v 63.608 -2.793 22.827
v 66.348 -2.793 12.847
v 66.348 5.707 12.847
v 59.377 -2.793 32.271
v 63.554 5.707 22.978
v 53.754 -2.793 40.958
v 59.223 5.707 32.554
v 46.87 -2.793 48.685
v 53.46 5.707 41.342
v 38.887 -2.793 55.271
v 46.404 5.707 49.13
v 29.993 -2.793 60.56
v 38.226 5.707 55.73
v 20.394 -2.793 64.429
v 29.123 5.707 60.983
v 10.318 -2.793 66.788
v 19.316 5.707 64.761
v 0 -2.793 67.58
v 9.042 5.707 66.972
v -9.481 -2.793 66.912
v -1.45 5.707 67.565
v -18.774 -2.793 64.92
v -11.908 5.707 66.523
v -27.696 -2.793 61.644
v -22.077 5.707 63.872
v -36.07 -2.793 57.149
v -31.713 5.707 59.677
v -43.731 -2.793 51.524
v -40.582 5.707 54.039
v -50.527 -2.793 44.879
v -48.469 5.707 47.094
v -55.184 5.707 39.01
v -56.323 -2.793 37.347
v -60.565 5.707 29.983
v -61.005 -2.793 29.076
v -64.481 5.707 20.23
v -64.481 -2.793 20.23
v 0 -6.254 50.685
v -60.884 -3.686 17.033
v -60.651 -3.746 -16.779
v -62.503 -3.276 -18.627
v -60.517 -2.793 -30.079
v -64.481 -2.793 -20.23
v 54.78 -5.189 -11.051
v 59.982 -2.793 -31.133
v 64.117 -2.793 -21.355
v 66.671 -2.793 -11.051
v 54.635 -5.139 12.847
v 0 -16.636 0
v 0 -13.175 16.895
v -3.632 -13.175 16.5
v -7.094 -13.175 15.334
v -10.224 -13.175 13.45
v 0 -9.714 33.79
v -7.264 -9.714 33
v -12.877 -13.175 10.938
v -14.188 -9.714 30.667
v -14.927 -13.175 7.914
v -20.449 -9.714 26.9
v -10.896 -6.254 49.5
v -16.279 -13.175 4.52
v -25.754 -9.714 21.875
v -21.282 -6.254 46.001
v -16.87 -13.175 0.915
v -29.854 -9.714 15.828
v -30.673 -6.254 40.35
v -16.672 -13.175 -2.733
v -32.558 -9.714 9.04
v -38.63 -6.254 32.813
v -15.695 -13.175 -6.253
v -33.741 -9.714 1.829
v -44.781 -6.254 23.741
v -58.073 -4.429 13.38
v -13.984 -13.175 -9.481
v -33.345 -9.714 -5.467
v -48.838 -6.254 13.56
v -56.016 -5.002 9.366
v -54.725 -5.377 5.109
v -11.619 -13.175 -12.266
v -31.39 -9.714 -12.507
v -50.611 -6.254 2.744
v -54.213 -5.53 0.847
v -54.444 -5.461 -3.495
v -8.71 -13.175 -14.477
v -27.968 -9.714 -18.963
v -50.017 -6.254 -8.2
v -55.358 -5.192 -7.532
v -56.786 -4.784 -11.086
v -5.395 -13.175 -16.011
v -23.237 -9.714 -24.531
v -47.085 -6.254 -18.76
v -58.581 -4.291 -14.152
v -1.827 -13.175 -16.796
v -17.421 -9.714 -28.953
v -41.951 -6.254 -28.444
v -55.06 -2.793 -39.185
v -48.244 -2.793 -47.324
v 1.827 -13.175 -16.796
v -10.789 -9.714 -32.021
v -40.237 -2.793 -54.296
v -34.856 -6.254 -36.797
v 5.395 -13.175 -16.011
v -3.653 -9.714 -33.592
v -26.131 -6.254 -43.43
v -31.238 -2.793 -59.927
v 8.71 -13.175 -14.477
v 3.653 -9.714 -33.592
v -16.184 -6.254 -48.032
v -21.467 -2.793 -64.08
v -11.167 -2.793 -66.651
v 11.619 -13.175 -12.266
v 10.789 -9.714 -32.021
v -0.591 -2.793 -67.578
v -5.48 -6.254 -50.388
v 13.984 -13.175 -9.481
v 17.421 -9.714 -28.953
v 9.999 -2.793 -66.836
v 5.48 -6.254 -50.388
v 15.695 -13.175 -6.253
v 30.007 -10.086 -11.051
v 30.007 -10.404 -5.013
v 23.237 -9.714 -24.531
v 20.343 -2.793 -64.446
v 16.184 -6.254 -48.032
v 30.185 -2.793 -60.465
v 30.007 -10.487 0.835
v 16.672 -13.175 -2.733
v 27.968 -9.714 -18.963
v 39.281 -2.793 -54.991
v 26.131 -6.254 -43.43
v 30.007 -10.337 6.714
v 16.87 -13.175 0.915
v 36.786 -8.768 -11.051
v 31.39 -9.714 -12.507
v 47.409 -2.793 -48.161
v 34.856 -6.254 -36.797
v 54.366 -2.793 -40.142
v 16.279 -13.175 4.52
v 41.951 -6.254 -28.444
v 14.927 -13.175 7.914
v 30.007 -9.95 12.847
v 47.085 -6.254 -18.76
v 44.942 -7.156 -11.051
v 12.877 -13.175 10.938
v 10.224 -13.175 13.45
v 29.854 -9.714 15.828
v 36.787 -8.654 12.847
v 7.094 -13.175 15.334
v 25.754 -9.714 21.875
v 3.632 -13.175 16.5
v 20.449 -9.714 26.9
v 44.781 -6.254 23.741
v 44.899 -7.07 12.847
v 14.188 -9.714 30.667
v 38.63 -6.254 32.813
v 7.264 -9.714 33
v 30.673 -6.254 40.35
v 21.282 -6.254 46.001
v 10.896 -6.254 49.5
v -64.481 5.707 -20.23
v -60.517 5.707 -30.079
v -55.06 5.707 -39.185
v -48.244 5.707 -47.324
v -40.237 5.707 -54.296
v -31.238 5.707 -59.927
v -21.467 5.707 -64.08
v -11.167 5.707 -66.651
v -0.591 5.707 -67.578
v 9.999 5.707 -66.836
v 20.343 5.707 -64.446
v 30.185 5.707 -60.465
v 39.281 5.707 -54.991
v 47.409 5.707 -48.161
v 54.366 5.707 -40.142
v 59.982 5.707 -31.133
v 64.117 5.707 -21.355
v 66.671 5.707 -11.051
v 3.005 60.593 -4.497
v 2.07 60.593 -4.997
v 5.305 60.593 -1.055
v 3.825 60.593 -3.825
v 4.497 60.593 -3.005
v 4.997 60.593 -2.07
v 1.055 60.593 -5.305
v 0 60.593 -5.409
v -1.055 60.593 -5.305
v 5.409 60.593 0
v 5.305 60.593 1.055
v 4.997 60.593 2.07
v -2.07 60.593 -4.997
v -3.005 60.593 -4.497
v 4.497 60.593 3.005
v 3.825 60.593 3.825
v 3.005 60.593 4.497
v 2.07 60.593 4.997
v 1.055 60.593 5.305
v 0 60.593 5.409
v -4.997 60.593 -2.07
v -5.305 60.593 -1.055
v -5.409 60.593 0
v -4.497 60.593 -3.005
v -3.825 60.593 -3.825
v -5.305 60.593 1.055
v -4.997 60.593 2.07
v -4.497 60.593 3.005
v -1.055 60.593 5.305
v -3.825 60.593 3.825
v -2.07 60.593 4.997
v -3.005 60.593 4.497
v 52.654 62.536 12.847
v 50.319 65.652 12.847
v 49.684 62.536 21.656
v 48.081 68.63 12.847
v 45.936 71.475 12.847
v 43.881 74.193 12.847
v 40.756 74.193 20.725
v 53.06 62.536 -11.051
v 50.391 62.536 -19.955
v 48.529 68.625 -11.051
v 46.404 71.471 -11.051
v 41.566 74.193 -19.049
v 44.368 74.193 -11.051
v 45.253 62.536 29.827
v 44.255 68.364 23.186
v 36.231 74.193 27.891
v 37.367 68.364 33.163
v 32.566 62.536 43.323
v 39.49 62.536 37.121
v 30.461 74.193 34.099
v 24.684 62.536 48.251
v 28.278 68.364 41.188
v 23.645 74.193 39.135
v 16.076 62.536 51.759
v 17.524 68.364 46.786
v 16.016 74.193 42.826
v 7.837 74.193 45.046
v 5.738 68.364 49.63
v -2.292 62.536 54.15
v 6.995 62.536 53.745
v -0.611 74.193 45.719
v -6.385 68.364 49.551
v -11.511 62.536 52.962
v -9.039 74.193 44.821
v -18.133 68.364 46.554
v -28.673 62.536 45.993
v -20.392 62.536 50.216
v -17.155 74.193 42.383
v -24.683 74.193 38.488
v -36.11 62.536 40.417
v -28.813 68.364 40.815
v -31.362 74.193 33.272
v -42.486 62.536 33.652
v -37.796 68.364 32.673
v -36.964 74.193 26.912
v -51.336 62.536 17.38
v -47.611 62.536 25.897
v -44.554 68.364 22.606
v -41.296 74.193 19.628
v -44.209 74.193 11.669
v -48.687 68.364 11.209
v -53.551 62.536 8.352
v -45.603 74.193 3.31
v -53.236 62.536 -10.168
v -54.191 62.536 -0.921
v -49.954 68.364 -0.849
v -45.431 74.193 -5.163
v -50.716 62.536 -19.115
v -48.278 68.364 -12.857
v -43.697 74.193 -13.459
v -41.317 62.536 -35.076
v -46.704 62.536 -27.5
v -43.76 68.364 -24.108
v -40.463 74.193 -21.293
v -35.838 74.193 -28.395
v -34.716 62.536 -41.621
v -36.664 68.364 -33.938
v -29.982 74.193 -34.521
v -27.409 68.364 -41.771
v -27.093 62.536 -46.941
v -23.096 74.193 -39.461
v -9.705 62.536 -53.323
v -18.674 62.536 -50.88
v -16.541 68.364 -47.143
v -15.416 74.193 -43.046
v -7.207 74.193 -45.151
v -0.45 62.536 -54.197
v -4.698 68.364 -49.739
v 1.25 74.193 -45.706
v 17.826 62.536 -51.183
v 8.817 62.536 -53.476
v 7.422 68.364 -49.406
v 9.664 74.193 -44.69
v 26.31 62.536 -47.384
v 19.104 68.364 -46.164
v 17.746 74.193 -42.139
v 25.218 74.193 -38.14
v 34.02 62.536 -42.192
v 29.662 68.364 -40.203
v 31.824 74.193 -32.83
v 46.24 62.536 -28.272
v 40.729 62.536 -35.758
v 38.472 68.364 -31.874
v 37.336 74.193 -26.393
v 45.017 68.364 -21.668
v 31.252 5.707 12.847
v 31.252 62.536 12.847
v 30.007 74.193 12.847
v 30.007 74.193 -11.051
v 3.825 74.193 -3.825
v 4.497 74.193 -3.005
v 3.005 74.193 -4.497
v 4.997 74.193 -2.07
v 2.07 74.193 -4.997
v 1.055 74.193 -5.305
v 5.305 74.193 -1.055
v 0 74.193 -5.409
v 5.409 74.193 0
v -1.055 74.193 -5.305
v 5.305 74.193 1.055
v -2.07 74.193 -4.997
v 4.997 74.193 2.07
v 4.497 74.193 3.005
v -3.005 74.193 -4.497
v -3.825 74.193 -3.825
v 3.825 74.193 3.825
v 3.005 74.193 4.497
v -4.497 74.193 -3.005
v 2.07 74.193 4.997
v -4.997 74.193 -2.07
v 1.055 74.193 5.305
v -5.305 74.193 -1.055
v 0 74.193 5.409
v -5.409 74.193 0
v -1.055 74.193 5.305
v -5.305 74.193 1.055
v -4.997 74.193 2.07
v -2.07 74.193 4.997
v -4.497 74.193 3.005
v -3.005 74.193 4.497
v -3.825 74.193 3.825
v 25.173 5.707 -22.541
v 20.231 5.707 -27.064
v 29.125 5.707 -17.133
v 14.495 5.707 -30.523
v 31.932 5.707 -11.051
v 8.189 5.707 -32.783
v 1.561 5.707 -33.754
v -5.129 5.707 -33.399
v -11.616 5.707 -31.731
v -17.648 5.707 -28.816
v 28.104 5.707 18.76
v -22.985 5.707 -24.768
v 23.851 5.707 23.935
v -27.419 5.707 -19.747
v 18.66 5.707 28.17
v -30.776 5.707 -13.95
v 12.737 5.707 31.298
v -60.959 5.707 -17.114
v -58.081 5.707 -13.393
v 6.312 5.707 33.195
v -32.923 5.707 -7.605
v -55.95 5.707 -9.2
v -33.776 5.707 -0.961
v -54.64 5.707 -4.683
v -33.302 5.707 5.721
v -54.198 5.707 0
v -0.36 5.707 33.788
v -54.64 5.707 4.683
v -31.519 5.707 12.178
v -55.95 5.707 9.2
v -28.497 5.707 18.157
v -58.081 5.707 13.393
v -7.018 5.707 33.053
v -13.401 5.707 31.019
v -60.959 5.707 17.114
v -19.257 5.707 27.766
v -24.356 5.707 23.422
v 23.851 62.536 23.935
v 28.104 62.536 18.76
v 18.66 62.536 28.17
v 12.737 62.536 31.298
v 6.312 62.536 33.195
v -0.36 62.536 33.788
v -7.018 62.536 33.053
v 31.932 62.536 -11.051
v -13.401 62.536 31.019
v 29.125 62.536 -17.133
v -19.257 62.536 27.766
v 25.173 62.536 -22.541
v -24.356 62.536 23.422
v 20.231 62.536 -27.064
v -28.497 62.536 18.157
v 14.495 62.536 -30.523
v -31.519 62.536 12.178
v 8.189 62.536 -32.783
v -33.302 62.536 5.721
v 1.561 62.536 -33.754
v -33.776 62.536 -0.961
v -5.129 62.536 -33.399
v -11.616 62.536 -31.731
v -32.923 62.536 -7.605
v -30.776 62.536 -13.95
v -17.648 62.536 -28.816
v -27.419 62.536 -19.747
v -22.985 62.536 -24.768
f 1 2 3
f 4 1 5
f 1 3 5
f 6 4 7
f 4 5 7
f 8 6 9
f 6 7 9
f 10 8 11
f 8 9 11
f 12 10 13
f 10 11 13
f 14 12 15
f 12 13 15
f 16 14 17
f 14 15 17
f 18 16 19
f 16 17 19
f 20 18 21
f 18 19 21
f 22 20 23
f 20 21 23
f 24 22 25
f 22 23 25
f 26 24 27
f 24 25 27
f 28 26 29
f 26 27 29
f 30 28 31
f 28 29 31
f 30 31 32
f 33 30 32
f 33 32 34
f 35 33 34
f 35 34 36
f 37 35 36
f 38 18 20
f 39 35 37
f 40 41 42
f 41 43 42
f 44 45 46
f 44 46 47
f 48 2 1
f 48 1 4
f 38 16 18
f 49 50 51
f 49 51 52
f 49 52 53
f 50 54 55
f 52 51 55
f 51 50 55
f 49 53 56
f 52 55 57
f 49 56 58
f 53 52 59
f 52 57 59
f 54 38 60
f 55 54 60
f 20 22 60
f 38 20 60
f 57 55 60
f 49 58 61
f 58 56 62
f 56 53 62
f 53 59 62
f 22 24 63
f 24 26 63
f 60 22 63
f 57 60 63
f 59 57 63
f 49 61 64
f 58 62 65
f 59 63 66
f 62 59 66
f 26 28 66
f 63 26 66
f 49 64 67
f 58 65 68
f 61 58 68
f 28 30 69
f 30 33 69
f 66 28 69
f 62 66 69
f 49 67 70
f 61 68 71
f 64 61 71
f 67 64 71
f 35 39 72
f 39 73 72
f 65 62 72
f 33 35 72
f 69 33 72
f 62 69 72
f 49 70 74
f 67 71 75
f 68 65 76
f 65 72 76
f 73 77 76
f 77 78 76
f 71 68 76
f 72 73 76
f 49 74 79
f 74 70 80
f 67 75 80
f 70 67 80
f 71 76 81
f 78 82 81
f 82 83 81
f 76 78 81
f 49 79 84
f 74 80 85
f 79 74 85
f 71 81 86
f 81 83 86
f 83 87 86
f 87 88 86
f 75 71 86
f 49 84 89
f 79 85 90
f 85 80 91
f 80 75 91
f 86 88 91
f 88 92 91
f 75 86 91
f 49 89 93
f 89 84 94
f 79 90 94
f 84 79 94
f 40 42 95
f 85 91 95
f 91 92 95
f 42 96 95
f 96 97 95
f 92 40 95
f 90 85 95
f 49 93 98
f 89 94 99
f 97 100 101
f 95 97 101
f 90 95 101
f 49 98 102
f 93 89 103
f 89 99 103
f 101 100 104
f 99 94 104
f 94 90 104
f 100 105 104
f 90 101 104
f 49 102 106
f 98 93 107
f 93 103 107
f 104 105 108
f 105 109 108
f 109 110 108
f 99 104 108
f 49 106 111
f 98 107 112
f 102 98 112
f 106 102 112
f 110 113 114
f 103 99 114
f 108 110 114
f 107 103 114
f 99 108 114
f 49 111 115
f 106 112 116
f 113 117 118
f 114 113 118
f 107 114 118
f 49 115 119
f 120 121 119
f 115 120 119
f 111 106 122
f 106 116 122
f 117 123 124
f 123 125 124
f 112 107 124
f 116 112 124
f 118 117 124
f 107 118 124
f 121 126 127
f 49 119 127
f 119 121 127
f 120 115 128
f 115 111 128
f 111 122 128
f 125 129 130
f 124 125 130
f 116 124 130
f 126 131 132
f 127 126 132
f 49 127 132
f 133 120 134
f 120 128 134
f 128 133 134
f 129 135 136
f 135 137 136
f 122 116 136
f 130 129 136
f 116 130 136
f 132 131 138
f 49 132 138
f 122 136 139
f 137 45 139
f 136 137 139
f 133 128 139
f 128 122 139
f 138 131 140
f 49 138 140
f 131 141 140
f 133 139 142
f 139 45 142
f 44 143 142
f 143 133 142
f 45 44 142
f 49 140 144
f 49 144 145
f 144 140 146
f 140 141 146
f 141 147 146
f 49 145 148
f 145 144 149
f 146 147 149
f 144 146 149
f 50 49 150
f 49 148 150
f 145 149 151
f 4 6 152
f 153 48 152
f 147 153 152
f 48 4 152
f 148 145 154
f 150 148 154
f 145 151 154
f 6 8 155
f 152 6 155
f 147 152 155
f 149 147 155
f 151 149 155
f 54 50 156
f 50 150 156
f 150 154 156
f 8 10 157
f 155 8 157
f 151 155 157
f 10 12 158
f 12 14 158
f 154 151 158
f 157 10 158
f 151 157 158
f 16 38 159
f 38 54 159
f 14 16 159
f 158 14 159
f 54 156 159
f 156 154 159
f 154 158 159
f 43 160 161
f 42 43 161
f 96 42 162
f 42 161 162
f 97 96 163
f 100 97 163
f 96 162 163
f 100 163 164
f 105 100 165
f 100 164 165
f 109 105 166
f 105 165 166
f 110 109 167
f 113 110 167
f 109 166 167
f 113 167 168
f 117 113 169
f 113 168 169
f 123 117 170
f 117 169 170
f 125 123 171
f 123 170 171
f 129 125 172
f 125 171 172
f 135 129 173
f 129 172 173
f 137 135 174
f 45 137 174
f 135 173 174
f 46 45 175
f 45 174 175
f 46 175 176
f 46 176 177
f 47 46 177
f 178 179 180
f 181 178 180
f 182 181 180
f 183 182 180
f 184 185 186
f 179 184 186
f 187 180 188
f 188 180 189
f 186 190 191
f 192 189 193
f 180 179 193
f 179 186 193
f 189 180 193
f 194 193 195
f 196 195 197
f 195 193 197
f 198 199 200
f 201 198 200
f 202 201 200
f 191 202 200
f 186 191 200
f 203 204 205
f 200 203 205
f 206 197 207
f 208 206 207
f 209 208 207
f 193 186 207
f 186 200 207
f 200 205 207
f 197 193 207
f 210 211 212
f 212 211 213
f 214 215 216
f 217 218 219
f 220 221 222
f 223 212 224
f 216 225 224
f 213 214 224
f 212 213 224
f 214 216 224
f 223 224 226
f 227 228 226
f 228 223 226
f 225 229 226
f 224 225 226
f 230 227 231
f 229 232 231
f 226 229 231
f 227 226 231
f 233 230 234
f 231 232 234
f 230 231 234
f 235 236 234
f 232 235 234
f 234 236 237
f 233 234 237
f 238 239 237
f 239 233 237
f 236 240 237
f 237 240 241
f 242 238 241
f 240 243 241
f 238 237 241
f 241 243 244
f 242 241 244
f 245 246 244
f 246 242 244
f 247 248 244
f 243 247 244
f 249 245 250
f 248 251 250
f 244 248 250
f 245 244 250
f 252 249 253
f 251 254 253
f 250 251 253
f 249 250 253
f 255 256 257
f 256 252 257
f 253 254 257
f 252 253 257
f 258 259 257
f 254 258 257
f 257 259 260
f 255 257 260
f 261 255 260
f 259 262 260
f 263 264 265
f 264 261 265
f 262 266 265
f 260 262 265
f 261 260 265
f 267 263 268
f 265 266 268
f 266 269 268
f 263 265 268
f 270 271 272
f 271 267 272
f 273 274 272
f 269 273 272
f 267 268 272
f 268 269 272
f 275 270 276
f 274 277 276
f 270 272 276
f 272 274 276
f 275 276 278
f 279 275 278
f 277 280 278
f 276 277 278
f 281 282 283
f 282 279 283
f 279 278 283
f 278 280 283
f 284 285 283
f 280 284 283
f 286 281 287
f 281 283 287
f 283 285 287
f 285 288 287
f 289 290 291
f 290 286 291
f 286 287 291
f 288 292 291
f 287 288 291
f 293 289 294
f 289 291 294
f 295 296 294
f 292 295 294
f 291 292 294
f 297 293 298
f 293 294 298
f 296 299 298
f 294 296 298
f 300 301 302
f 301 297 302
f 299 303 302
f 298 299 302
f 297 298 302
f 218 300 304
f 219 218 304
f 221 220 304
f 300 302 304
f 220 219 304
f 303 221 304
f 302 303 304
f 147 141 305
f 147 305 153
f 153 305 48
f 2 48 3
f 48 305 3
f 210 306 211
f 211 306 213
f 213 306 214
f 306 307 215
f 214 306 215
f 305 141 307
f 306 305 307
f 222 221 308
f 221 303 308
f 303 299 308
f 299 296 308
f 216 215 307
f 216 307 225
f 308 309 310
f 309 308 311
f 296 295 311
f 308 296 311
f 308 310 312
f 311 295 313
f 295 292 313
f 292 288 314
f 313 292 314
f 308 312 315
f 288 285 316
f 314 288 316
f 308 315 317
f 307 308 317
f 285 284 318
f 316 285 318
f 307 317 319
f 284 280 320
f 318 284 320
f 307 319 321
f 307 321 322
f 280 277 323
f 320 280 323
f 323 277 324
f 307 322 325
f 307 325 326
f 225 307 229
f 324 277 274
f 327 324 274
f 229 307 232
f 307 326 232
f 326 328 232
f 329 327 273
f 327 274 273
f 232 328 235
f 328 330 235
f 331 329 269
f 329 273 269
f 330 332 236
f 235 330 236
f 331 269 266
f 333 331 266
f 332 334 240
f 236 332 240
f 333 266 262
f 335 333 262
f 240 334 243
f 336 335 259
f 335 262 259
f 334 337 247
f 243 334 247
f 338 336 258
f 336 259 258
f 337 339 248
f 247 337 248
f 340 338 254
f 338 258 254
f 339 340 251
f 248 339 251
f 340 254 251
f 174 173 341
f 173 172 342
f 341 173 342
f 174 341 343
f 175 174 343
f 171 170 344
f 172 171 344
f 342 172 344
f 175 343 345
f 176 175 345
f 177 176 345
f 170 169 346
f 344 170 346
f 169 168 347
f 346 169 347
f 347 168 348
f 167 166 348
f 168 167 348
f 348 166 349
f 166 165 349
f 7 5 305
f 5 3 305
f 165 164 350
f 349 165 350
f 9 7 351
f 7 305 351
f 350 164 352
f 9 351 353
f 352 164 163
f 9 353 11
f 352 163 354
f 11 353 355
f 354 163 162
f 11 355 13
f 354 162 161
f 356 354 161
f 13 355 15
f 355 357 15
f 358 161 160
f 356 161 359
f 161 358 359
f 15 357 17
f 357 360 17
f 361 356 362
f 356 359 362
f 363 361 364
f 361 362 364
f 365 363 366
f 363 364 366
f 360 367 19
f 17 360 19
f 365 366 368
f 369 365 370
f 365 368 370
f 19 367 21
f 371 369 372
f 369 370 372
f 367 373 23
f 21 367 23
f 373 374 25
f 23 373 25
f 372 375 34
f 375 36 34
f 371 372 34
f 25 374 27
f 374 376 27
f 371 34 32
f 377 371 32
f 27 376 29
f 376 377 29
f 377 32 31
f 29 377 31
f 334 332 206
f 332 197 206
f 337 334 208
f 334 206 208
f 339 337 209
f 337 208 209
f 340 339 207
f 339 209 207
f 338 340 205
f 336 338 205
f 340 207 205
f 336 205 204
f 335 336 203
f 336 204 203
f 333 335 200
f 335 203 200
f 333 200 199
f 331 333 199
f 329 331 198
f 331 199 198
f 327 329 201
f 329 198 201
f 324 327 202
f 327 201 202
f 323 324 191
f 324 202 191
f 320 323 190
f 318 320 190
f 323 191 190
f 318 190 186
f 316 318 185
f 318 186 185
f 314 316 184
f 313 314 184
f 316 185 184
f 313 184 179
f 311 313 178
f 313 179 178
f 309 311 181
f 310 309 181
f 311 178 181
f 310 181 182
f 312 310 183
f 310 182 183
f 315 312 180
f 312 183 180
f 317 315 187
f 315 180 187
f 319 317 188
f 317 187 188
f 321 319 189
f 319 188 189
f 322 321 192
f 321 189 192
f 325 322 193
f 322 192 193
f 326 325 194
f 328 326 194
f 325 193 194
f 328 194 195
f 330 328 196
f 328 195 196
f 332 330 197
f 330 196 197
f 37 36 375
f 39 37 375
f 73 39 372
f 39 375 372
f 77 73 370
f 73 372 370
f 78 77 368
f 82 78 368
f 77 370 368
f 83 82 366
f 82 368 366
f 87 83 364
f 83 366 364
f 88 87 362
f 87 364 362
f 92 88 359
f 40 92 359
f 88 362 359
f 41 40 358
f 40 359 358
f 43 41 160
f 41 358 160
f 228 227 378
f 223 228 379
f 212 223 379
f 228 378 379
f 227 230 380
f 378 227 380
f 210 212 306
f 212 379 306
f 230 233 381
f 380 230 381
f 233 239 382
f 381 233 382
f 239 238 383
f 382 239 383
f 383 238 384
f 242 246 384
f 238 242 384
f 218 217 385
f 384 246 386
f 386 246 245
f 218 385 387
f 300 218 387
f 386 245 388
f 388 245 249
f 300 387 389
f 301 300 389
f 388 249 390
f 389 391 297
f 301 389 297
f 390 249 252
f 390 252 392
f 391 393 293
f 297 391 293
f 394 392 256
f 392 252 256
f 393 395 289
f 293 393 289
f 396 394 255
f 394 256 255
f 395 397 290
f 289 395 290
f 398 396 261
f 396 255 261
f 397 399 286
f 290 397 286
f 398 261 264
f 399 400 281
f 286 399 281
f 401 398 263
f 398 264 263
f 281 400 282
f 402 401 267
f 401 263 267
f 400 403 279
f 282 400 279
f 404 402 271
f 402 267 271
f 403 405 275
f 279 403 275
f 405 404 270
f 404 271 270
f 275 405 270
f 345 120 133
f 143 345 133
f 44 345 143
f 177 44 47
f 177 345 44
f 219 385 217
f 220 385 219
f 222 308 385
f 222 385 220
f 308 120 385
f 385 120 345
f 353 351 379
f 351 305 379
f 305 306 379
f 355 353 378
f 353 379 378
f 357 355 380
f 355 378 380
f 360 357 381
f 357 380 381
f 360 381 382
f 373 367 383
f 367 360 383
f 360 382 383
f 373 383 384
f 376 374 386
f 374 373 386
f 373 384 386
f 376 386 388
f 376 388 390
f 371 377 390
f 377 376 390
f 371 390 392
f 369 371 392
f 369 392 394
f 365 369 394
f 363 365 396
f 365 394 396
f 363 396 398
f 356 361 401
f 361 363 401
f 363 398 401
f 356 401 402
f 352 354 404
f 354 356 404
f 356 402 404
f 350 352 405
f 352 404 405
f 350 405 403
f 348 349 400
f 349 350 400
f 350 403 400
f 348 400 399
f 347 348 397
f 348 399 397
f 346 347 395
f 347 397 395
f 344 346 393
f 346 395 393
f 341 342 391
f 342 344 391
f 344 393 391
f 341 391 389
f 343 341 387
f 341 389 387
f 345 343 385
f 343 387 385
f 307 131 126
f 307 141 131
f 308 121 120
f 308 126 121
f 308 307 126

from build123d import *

# Parameters (mm, degrees)
ESQUISSE2_R             = 25.041983138
ESQUISSE2_W             = 44.202160672
ESQUISSE2_H             = 23.897916136
ENL_V_MAT_EXTRU_1_DEPTH = 90


with BuildPart() as part:
    # Esquisse1 → Révolution1 (revolve)
    with BuildSketch(Plane.XY, mode=Mode.PRIVATE) as r_volution1_sk:
        Polygon((-45.722988866, 74.192857143), (-5.408703152, 74.192857143), (-5.408703152, 60.592857143), (0, 60.592857143), (0, -16.635714286), (-67.580131723, -2.792857143), (-67.580131723, 5.707142857), (-33.790065862, 5.707142857), (-33.790065862, 62.535714286), (-54.198475628, 62.535714286), align=None)
    revolve(r_volution1_sk.sketch.rotate(Axis((0, 60.592857143, 0), (0, -1, 0)), 270), axis=Axis((0, 60.592857143, 0), (0, -1, 0)))

    # Esquisse2 → Enlèv. mat.-Extru.1 (cut)
    with BuildSketch(Plane(origin=(0, 74.192857143, 0), x_dir=(1, 0, 0), z_dir=(0, 1, 0))):
        with Locations((-79.240458765, 0)):
            Circle(ESQUISSE2_R)
        with Locations((52.10823819, -0.8984179)):
            Rectangle(ESQUISSE2_W, ESQUISSE2_H)
    extrude(amount=-ENL_V_MAT_EXTRU_1_DEPTH, mode=Mode.SUBTRACT)


solid = part.part
